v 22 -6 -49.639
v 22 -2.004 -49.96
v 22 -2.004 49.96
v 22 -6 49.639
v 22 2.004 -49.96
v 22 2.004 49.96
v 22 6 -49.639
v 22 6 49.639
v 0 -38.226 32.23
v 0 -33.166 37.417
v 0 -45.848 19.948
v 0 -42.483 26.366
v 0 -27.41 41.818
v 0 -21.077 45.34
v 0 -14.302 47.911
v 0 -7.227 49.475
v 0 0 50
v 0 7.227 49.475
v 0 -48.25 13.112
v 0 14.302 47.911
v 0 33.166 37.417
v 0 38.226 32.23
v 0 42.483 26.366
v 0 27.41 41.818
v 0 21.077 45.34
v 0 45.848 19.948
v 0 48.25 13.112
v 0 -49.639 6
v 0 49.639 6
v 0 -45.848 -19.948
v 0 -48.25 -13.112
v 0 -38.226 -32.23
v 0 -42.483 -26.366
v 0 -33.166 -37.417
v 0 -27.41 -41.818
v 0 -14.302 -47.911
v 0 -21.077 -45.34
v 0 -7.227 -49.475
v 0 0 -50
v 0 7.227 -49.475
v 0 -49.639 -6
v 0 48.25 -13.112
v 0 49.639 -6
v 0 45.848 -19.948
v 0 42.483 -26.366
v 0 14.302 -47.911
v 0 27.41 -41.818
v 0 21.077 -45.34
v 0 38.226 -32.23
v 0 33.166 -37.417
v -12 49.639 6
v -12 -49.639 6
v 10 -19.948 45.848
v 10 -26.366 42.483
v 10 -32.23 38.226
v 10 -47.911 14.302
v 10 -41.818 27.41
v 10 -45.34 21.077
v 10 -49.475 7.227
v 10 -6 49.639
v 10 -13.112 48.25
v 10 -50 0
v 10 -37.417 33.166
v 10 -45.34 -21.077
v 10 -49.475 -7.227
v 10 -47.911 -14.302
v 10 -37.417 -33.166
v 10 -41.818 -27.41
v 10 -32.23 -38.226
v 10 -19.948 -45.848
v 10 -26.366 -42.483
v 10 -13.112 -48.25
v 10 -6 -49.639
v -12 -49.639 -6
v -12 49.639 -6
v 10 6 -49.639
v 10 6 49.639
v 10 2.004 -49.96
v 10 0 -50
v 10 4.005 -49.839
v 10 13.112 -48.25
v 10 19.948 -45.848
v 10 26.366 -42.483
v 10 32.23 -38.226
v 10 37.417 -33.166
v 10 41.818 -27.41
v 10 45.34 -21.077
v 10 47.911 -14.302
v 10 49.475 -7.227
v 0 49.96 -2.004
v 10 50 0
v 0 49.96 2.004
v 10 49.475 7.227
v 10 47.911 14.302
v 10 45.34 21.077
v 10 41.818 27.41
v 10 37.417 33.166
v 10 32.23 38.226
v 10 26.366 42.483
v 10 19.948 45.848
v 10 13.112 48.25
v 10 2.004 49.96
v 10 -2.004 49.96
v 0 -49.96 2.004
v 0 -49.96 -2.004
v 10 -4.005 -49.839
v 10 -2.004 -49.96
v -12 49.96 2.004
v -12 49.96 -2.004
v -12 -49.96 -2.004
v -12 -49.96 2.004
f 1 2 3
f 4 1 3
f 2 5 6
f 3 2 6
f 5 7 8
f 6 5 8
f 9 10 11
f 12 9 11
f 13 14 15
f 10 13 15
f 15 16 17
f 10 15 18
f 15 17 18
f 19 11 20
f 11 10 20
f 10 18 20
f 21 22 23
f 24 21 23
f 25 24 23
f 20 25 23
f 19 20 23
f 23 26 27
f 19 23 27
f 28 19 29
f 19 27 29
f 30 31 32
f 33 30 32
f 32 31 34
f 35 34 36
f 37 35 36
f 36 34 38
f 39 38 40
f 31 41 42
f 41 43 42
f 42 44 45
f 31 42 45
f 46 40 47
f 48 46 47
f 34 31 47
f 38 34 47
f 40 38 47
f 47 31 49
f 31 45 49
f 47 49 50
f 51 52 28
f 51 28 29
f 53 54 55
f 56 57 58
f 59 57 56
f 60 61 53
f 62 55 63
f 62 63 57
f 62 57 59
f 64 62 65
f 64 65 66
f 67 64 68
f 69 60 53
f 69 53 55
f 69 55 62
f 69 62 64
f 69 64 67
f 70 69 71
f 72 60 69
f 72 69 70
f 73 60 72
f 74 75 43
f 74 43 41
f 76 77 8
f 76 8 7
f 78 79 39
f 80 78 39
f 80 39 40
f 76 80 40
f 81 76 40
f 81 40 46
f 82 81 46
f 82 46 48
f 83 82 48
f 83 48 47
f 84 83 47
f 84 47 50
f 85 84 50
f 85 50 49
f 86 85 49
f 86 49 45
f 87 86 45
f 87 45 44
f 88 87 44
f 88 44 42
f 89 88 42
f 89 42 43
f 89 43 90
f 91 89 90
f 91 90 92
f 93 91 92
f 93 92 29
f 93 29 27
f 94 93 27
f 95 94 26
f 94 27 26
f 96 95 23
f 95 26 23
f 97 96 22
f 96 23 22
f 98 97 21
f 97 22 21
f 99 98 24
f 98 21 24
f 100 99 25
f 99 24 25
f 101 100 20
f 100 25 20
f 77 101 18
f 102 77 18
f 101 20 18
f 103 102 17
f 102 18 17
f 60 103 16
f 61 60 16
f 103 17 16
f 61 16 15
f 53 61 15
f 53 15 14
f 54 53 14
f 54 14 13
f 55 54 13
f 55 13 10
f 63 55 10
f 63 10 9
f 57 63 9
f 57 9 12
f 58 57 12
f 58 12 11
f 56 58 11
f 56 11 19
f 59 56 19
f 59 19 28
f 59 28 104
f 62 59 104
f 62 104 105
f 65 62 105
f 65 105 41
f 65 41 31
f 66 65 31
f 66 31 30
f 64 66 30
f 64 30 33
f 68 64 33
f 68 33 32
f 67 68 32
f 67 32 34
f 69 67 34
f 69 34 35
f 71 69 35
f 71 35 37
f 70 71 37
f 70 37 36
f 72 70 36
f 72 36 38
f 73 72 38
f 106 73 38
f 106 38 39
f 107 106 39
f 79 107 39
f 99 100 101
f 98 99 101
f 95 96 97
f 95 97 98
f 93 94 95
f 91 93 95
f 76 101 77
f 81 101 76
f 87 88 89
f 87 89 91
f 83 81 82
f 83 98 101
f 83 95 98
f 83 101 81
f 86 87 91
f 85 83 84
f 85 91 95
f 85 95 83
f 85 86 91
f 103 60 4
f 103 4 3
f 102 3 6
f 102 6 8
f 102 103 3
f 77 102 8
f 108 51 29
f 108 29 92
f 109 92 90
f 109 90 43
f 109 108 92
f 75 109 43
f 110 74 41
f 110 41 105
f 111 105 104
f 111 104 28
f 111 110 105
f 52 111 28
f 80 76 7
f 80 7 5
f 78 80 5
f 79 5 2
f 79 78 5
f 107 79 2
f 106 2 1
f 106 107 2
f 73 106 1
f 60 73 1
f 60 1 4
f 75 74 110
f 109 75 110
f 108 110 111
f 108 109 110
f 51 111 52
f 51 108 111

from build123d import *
from build123d.topology import SkipClean

# Parameters (mm, degrees)
SKETCH1_R           = 50
BOSS_EXTRUDE1_DEPTH = 10
BOSS_EXTRUDE2_DEPTH = 12
BOSS_EXTRUDE3_START = 12
BOSS_EXTRUDE3_DEPTH = 12


with BuildPart() as part:
    # Sketch1 → Boss-Extrude1 (new body)
    with BuildSketch(Plane(origin=(0, 0, 0), x_dir=(0, 0, -1), z_dir=(1, 0, 0))):
        Circle(SKETCH1_R)
    extrude(amount=BOSS_EXTRUDE1_DEPTH)

    # Sketch2 → Boss-Extrude2 (add)
    with SkipClean():  # the faces are left unmerged after this step: merging them gives an invalid solid
        with BuildSketch(Plane(origin=(10, 0, 0), x_dir=(0, 0, -1), z_dir=(1, 0, 0))):
            with BuildLine():
                Line((-49.638694584, 6), (49.638694584, 6))
                ThreePointArc((49.638694584, 6), (50, 0), (49.638694584, -6))
                Line((49.638694584, -6), (-49.638694584, -6))
                ThreePointArc((-49.638694584, -6), (-50, 0), (-49.638694584, 6))
            make_face()
        extrude(amount=BOSS_EXTRUDE2_DEPTH)

    # Sketch3 → Boss-Extrude3 (add)
    with SkipClean():  # the faces are left unmerged after this step: merging them gives an invalid solid
        with BuildSketch(Plane.ZY.offset(BOSS_EXTRUDE3_START)):
            with BuildLine():
                ThreePointArc((6, 49.638694584), (0, 50), (-6, 49.638694584))
                Line((-6, 49.638694584), (-6, -49.638694584))
                ThreePointArc((-6, -49.638694584), (0, -50), (6, -49.638694584))
                Line((6, -49.638694584), (6, 49.638694584))
            make_face()
        extrude(amount=-BOSS_EXTRUDE3_DEPTH)


solid = part.part
